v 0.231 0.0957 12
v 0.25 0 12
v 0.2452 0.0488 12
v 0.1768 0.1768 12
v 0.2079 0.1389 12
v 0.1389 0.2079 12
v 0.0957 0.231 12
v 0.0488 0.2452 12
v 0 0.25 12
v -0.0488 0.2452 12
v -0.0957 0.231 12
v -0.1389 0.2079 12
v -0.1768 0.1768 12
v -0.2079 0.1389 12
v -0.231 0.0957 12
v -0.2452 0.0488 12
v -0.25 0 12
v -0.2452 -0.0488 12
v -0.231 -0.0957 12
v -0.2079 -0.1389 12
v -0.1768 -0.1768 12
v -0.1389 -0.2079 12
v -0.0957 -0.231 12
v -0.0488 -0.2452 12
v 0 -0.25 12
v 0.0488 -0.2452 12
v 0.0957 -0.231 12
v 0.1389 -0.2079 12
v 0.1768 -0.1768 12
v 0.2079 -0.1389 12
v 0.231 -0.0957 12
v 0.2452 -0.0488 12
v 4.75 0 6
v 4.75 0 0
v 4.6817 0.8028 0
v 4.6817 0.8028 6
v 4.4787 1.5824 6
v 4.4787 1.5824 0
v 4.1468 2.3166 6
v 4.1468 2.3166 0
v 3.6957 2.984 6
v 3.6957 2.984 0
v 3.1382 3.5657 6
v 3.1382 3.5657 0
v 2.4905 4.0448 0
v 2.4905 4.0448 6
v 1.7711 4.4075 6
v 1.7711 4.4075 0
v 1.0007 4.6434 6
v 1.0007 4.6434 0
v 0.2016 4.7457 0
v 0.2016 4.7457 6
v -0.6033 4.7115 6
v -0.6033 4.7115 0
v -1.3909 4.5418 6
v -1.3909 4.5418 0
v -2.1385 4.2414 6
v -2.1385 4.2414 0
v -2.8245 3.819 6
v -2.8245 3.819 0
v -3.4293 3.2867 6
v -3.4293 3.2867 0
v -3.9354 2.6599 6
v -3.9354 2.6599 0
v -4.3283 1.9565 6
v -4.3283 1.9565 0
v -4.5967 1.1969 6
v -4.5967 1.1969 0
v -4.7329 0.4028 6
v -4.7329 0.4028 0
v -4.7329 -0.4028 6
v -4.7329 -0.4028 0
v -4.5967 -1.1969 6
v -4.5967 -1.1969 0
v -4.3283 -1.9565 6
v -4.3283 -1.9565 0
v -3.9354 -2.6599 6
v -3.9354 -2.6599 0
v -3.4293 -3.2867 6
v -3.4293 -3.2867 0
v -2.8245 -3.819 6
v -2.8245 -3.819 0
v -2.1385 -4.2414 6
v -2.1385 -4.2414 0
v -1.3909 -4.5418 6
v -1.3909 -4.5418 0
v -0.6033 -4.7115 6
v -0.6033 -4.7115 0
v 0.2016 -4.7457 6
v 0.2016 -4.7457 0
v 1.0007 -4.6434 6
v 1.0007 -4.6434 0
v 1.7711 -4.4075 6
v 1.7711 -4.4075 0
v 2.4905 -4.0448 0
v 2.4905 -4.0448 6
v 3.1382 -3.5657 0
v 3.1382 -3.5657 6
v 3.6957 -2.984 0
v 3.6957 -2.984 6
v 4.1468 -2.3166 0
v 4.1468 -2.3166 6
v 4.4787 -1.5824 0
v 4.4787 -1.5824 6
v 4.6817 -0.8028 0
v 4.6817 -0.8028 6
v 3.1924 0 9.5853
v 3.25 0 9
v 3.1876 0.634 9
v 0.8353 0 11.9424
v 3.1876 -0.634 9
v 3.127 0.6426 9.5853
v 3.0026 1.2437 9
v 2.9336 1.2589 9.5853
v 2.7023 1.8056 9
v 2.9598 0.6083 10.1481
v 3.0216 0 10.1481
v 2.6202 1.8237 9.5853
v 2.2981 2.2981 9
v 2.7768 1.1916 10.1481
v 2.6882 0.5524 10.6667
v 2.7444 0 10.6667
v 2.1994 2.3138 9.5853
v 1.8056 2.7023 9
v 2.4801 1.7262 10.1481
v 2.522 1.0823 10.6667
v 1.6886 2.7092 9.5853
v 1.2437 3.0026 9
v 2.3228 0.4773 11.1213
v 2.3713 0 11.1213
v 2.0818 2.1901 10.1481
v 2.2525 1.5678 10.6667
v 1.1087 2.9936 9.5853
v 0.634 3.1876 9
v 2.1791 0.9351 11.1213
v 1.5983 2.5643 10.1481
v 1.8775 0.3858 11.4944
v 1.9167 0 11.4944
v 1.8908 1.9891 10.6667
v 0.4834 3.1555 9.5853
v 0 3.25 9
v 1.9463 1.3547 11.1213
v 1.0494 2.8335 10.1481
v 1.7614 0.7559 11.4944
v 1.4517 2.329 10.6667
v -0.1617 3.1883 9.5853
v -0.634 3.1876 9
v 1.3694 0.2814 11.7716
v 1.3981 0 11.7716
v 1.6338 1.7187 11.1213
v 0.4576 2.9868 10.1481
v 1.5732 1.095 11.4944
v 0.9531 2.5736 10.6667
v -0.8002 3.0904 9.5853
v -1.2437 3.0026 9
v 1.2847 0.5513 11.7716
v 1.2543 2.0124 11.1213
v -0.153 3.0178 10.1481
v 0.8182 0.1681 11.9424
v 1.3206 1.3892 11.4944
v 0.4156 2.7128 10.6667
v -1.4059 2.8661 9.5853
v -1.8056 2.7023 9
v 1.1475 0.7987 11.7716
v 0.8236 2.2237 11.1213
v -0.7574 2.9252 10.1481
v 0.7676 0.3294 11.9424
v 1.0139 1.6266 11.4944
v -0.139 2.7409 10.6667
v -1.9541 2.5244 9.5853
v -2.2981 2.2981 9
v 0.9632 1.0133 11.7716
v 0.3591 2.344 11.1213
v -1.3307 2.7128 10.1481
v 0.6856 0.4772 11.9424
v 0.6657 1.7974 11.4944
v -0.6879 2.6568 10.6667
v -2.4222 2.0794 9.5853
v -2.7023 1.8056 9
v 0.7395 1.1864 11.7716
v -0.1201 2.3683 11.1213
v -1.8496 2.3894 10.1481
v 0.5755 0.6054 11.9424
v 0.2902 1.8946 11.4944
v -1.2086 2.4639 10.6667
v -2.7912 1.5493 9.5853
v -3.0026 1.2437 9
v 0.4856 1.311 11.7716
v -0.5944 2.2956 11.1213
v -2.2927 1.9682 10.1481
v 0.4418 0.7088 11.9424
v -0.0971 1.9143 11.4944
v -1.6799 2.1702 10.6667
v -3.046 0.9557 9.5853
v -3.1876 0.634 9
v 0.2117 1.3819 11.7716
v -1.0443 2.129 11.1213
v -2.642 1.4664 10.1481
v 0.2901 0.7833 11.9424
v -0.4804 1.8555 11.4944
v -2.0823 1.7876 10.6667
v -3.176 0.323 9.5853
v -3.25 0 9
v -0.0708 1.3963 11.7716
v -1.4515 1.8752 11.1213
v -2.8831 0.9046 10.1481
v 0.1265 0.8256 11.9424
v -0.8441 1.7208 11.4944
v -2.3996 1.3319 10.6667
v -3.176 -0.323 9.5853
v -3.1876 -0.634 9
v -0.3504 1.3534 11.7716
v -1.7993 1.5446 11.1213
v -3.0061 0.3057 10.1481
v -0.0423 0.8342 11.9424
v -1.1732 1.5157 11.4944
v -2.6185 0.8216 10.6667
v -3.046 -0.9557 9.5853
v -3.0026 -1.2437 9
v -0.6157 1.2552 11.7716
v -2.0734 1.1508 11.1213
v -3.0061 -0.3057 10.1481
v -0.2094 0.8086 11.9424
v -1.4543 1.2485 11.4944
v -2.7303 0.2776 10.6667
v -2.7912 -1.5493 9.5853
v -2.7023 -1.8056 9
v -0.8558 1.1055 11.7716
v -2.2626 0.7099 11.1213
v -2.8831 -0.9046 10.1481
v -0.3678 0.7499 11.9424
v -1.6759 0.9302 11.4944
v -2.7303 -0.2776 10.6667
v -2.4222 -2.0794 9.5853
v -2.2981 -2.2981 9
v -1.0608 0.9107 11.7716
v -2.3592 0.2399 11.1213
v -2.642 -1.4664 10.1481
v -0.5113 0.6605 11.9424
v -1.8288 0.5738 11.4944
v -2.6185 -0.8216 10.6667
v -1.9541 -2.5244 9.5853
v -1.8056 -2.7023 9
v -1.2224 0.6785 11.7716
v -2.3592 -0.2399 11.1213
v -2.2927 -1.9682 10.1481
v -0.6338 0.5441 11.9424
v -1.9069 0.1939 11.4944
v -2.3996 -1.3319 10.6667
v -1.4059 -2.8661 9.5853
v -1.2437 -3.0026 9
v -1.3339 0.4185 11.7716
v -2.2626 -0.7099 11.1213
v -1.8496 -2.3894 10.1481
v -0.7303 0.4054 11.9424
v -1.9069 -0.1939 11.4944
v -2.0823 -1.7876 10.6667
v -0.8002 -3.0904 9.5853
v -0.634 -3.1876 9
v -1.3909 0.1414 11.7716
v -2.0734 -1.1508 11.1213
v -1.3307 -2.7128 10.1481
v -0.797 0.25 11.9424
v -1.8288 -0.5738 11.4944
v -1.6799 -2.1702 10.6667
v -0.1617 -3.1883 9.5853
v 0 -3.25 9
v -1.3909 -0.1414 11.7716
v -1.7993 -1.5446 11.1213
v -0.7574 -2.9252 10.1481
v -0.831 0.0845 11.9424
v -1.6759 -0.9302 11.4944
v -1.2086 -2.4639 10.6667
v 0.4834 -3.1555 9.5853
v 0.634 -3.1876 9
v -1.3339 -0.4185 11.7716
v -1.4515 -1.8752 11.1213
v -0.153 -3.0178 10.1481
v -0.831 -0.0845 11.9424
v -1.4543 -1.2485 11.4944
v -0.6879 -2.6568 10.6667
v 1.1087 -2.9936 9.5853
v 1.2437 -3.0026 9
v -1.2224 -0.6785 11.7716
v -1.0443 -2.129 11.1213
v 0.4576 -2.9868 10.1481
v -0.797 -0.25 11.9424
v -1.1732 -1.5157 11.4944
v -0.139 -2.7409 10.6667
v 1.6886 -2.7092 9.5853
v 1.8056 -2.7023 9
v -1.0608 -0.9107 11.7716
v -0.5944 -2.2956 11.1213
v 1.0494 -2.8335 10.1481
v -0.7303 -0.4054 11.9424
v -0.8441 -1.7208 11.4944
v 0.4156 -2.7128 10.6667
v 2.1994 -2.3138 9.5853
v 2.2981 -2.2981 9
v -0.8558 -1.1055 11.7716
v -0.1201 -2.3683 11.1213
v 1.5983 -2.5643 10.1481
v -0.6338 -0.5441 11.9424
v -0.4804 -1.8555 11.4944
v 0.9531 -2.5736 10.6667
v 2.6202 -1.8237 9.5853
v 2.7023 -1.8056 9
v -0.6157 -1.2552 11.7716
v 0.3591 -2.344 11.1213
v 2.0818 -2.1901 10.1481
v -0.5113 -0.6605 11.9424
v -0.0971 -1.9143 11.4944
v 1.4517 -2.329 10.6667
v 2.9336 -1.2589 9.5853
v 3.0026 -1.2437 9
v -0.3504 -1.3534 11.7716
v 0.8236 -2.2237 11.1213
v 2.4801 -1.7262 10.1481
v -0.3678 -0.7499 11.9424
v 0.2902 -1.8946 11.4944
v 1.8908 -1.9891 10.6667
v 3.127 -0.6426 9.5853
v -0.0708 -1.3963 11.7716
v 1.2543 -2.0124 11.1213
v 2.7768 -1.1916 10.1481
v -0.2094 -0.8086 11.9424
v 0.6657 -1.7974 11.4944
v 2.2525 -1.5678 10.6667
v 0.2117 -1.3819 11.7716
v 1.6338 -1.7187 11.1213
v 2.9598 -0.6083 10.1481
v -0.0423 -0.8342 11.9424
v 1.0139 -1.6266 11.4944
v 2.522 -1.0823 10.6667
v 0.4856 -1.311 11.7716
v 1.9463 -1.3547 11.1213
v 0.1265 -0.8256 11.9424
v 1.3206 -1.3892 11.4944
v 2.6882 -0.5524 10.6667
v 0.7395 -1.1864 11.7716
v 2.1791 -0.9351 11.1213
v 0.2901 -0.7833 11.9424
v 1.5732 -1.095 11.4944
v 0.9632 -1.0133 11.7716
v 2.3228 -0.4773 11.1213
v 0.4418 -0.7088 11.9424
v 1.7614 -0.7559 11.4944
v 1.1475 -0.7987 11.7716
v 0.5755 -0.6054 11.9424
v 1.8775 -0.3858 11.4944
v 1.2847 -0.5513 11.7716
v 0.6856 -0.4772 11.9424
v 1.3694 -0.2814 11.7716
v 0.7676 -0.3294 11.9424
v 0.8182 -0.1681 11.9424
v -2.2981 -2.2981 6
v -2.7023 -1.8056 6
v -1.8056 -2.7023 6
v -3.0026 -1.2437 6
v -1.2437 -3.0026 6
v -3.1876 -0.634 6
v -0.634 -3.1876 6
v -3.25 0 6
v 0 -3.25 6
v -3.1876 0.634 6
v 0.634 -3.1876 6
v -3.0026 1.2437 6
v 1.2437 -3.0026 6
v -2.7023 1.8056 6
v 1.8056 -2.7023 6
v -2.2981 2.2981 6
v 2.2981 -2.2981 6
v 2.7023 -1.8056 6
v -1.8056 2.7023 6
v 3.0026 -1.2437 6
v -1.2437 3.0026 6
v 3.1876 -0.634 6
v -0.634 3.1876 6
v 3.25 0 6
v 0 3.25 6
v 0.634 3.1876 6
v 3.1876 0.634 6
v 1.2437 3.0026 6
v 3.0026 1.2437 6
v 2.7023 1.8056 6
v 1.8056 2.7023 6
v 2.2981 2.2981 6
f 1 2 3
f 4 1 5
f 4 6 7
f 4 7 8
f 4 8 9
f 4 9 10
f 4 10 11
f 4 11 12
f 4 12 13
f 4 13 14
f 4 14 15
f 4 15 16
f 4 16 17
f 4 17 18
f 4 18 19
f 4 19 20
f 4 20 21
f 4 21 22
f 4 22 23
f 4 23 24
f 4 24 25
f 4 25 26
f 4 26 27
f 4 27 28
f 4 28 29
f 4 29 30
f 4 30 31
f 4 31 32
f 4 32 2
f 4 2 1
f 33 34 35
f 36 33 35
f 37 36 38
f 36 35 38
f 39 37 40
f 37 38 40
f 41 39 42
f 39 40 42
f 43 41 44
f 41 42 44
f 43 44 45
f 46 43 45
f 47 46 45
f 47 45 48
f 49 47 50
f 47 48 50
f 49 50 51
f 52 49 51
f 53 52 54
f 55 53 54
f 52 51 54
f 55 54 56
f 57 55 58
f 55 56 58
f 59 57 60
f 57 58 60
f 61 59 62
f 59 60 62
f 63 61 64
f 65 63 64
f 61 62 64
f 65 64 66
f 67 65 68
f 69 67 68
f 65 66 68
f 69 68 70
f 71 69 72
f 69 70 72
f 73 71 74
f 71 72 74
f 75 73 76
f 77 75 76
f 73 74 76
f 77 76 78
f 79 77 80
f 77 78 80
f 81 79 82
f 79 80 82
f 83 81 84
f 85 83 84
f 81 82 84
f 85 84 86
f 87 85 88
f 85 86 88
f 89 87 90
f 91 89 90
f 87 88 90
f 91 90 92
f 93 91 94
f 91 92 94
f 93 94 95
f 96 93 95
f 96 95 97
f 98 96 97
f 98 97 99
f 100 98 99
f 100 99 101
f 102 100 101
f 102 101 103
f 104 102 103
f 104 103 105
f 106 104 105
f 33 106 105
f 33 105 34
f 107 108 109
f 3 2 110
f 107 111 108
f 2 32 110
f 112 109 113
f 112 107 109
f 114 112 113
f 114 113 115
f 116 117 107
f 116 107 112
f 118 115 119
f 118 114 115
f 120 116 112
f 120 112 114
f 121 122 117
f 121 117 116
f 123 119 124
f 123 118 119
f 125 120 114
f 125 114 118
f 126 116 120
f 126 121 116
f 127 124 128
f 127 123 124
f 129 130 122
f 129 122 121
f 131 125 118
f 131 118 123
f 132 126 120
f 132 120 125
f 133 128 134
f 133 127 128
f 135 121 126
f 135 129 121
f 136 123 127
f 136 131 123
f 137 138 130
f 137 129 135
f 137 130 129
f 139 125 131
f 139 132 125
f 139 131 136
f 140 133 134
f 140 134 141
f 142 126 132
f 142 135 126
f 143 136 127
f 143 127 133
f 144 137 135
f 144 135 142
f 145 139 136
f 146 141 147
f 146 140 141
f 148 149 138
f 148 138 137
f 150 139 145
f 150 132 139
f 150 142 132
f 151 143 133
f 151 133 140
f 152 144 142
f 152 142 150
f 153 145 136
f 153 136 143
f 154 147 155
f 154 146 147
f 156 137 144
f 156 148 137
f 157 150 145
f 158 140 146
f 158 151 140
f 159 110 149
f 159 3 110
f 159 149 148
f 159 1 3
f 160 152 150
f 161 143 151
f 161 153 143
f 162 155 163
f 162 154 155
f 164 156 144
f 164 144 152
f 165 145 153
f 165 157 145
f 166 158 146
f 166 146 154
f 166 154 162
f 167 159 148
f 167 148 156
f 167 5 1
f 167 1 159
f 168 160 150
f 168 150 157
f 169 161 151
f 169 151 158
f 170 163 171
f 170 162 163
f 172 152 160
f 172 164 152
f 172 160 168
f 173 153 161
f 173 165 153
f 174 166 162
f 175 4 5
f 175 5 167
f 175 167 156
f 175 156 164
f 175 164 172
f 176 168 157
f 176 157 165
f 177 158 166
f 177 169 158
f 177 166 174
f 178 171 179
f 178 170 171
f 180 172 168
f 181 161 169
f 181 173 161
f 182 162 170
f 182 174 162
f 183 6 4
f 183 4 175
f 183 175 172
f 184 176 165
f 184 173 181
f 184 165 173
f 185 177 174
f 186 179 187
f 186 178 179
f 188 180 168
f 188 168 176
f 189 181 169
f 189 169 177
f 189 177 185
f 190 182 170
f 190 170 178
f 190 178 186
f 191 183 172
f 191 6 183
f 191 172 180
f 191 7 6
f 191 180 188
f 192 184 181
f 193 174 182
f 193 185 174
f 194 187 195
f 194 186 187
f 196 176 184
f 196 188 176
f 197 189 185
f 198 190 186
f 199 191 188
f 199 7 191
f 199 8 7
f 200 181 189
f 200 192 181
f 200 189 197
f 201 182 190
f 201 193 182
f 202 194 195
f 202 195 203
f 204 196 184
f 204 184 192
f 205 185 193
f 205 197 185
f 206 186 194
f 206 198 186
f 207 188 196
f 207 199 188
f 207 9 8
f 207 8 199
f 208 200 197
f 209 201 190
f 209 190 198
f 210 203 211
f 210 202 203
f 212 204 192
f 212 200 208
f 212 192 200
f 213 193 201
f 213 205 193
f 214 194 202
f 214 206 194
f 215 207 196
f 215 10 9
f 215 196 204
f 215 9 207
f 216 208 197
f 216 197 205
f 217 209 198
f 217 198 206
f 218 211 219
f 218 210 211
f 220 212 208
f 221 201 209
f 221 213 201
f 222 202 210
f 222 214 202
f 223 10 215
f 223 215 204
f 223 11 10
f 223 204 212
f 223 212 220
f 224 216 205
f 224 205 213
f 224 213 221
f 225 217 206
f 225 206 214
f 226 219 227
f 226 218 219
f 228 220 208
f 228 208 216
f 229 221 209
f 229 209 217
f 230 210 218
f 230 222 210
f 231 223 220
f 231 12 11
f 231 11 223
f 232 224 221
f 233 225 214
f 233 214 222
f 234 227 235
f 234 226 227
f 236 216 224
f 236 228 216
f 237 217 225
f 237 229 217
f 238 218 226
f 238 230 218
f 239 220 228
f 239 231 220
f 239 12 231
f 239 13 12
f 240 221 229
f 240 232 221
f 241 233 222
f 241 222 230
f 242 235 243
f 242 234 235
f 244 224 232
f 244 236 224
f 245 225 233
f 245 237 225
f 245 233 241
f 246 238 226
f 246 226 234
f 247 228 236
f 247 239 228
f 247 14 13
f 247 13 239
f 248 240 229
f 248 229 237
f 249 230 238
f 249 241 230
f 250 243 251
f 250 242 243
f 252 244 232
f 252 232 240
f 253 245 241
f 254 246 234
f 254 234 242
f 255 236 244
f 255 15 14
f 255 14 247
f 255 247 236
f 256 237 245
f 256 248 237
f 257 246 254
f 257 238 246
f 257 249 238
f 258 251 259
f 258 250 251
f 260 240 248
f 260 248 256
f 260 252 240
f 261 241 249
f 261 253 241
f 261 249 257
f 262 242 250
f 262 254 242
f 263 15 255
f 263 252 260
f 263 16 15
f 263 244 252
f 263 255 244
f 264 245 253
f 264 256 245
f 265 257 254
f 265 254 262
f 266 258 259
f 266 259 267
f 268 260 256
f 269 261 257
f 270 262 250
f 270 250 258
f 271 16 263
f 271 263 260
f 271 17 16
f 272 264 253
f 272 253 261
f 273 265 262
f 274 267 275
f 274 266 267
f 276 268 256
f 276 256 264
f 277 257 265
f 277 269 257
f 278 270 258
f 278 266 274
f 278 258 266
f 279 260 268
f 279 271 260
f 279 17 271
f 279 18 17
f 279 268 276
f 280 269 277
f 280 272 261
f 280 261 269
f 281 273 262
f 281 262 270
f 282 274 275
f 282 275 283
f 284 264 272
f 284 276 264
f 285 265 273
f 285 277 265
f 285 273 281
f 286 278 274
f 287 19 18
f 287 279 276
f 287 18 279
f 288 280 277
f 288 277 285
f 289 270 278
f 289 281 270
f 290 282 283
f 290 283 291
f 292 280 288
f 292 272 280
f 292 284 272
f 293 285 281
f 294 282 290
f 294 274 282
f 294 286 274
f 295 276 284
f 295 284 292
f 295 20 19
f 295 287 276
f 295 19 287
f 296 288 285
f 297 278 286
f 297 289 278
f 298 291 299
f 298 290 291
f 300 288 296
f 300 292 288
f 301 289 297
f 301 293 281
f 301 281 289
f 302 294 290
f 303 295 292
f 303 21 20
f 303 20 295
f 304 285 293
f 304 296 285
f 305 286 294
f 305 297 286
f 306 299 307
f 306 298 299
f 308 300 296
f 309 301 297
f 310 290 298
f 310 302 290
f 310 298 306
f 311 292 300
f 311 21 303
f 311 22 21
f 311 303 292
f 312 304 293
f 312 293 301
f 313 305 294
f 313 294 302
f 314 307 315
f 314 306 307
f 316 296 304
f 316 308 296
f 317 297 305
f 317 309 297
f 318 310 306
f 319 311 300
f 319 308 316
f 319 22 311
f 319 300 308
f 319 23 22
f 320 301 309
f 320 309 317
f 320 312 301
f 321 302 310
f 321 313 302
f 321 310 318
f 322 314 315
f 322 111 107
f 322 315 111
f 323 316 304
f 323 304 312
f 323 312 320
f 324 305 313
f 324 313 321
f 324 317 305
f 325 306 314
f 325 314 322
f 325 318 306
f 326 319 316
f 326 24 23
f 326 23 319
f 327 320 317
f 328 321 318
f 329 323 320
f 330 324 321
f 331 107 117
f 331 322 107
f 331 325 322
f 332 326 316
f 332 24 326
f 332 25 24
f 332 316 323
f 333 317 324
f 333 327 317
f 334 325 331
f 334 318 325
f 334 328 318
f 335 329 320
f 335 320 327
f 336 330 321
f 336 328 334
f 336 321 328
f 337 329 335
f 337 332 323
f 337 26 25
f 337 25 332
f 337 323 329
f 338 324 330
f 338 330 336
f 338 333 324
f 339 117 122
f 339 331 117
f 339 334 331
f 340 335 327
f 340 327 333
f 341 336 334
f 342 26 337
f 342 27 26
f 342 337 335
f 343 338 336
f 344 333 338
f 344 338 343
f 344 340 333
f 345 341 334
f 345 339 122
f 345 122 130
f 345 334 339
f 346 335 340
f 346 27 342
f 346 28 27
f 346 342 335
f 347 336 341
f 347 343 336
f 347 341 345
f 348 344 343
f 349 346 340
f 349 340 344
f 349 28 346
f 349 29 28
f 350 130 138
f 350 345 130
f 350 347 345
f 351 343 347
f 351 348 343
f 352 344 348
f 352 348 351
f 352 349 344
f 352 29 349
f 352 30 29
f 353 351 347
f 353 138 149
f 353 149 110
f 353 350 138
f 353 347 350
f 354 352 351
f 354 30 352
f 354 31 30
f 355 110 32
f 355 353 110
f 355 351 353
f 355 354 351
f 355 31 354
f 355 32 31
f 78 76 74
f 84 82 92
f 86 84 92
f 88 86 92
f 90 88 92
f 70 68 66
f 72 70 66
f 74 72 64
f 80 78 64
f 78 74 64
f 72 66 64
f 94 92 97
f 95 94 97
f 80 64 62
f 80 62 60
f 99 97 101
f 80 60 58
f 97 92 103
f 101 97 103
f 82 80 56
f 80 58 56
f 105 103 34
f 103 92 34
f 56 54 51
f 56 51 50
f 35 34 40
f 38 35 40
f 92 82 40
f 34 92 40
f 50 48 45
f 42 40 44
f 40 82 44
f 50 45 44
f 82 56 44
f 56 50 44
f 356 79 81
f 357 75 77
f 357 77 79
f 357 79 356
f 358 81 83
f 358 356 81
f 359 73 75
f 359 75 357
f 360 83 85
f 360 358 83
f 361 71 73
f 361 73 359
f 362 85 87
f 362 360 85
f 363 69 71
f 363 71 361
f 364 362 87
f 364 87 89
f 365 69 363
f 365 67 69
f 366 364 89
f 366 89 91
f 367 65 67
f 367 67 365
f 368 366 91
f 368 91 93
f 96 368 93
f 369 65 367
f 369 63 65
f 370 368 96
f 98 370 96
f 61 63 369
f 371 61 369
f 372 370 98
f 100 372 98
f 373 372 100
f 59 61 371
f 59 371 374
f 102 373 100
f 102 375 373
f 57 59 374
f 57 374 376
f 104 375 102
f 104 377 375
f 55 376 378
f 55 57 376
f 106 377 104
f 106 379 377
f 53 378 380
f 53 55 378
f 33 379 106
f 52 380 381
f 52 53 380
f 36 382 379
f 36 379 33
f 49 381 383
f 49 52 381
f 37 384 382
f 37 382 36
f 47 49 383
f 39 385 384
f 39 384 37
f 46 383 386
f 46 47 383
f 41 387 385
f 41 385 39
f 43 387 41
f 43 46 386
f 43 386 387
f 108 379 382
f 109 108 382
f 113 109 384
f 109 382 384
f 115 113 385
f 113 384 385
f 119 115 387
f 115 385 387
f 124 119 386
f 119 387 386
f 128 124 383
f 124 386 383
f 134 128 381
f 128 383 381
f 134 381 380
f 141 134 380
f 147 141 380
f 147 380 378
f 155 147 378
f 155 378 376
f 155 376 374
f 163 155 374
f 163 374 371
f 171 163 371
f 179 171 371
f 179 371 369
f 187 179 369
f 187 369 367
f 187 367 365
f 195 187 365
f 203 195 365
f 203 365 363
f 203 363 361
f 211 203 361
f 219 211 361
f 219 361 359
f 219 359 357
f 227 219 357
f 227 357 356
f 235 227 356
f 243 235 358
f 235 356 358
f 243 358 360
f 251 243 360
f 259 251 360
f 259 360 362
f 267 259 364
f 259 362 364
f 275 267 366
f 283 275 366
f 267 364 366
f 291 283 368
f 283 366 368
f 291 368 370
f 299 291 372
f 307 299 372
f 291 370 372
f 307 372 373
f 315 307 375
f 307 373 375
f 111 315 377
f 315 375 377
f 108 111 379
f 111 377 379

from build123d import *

# Parameters (mm, degrees)
F0_R     = 3.25
F1_DEPTH = 12
F0_R_2   = 4.75
F2_DEPTH = 6
F3_R     = 3


with BuildPart() as f1:
    # F0 (on Top) → F1 (new body)
    with BuildSketch(Plane.XY):
        Circle(F0_R)
    extrude(amount=F1_DEPTH)

    # F0 (on Top) → F2 (join)
    with BuildSketch(Plane.XY):
        Circle(F0_R_2)
        Circle(F0_R, mode=Mode.SUBTRACT)
    extrude(amount=F2_DEPTH)

    # F3
    f3_edges = [f1.edges().sort_by_distance(p)[0] for p in [
        (-3.25, 0, 12),
    ]]
    fillet(f3_edges, radius=F3_R)


solid = f1.part
